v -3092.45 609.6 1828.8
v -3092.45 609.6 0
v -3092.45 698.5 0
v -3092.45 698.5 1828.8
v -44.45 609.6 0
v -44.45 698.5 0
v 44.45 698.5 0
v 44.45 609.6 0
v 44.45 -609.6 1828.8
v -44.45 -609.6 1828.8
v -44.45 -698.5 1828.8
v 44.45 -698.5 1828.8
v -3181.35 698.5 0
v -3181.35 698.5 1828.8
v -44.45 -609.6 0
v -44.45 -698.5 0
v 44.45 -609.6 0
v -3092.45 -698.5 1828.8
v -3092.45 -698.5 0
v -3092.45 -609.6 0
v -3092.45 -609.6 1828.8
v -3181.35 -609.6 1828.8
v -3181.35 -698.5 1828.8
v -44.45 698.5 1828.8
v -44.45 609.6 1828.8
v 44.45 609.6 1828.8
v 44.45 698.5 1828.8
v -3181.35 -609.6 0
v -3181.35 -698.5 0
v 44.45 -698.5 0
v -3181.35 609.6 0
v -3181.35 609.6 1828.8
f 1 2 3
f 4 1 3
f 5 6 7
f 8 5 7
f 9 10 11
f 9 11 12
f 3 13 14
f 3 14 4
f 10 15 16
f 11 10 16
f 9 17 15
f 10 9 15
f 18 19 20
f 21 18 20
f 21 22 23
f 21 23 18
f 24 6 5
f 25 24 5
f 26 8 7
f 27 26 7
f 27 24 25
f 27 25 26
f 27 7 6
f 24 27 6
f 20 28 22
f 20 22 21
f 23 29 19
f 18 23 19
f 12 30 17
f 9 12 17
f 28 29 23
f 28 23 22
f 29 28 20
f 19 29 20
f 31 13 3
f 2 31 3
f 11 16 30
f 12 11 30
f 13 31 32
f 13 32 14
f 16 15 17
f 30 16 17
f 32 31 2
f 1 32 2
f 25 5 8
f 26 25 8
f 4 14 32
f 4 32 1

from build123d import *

# Parameters (mm, degrees)
F0_W     = 88.9
F0_H     = 88.9
F1_DEPTH = 1828.8


with BuildPart() as f1:
    # F0 (on Top) → F1 (new body)
    with BuildSketch(Plane.XY):
        Polygon((44.45, 609.6), (44.45, 698.5), (-44.45, 698.5), (-44.45, 609.6), (0, 609.6), align=None)
        Polygon((44.45, -609.6), (0, -609.6), (-44.45, -609.6), (-44.45, -698.5), (44.45, -698.5), align=None)
        with Locations((-3136.9, 654.05)):
            Rectangle(F0_W, F0_H)
        with Locations((-3136.9, -654.05)):
            Rectangle(F0_W, F0_H)
    extrude(amount=F1_DEPTH)


solid = f1.part
